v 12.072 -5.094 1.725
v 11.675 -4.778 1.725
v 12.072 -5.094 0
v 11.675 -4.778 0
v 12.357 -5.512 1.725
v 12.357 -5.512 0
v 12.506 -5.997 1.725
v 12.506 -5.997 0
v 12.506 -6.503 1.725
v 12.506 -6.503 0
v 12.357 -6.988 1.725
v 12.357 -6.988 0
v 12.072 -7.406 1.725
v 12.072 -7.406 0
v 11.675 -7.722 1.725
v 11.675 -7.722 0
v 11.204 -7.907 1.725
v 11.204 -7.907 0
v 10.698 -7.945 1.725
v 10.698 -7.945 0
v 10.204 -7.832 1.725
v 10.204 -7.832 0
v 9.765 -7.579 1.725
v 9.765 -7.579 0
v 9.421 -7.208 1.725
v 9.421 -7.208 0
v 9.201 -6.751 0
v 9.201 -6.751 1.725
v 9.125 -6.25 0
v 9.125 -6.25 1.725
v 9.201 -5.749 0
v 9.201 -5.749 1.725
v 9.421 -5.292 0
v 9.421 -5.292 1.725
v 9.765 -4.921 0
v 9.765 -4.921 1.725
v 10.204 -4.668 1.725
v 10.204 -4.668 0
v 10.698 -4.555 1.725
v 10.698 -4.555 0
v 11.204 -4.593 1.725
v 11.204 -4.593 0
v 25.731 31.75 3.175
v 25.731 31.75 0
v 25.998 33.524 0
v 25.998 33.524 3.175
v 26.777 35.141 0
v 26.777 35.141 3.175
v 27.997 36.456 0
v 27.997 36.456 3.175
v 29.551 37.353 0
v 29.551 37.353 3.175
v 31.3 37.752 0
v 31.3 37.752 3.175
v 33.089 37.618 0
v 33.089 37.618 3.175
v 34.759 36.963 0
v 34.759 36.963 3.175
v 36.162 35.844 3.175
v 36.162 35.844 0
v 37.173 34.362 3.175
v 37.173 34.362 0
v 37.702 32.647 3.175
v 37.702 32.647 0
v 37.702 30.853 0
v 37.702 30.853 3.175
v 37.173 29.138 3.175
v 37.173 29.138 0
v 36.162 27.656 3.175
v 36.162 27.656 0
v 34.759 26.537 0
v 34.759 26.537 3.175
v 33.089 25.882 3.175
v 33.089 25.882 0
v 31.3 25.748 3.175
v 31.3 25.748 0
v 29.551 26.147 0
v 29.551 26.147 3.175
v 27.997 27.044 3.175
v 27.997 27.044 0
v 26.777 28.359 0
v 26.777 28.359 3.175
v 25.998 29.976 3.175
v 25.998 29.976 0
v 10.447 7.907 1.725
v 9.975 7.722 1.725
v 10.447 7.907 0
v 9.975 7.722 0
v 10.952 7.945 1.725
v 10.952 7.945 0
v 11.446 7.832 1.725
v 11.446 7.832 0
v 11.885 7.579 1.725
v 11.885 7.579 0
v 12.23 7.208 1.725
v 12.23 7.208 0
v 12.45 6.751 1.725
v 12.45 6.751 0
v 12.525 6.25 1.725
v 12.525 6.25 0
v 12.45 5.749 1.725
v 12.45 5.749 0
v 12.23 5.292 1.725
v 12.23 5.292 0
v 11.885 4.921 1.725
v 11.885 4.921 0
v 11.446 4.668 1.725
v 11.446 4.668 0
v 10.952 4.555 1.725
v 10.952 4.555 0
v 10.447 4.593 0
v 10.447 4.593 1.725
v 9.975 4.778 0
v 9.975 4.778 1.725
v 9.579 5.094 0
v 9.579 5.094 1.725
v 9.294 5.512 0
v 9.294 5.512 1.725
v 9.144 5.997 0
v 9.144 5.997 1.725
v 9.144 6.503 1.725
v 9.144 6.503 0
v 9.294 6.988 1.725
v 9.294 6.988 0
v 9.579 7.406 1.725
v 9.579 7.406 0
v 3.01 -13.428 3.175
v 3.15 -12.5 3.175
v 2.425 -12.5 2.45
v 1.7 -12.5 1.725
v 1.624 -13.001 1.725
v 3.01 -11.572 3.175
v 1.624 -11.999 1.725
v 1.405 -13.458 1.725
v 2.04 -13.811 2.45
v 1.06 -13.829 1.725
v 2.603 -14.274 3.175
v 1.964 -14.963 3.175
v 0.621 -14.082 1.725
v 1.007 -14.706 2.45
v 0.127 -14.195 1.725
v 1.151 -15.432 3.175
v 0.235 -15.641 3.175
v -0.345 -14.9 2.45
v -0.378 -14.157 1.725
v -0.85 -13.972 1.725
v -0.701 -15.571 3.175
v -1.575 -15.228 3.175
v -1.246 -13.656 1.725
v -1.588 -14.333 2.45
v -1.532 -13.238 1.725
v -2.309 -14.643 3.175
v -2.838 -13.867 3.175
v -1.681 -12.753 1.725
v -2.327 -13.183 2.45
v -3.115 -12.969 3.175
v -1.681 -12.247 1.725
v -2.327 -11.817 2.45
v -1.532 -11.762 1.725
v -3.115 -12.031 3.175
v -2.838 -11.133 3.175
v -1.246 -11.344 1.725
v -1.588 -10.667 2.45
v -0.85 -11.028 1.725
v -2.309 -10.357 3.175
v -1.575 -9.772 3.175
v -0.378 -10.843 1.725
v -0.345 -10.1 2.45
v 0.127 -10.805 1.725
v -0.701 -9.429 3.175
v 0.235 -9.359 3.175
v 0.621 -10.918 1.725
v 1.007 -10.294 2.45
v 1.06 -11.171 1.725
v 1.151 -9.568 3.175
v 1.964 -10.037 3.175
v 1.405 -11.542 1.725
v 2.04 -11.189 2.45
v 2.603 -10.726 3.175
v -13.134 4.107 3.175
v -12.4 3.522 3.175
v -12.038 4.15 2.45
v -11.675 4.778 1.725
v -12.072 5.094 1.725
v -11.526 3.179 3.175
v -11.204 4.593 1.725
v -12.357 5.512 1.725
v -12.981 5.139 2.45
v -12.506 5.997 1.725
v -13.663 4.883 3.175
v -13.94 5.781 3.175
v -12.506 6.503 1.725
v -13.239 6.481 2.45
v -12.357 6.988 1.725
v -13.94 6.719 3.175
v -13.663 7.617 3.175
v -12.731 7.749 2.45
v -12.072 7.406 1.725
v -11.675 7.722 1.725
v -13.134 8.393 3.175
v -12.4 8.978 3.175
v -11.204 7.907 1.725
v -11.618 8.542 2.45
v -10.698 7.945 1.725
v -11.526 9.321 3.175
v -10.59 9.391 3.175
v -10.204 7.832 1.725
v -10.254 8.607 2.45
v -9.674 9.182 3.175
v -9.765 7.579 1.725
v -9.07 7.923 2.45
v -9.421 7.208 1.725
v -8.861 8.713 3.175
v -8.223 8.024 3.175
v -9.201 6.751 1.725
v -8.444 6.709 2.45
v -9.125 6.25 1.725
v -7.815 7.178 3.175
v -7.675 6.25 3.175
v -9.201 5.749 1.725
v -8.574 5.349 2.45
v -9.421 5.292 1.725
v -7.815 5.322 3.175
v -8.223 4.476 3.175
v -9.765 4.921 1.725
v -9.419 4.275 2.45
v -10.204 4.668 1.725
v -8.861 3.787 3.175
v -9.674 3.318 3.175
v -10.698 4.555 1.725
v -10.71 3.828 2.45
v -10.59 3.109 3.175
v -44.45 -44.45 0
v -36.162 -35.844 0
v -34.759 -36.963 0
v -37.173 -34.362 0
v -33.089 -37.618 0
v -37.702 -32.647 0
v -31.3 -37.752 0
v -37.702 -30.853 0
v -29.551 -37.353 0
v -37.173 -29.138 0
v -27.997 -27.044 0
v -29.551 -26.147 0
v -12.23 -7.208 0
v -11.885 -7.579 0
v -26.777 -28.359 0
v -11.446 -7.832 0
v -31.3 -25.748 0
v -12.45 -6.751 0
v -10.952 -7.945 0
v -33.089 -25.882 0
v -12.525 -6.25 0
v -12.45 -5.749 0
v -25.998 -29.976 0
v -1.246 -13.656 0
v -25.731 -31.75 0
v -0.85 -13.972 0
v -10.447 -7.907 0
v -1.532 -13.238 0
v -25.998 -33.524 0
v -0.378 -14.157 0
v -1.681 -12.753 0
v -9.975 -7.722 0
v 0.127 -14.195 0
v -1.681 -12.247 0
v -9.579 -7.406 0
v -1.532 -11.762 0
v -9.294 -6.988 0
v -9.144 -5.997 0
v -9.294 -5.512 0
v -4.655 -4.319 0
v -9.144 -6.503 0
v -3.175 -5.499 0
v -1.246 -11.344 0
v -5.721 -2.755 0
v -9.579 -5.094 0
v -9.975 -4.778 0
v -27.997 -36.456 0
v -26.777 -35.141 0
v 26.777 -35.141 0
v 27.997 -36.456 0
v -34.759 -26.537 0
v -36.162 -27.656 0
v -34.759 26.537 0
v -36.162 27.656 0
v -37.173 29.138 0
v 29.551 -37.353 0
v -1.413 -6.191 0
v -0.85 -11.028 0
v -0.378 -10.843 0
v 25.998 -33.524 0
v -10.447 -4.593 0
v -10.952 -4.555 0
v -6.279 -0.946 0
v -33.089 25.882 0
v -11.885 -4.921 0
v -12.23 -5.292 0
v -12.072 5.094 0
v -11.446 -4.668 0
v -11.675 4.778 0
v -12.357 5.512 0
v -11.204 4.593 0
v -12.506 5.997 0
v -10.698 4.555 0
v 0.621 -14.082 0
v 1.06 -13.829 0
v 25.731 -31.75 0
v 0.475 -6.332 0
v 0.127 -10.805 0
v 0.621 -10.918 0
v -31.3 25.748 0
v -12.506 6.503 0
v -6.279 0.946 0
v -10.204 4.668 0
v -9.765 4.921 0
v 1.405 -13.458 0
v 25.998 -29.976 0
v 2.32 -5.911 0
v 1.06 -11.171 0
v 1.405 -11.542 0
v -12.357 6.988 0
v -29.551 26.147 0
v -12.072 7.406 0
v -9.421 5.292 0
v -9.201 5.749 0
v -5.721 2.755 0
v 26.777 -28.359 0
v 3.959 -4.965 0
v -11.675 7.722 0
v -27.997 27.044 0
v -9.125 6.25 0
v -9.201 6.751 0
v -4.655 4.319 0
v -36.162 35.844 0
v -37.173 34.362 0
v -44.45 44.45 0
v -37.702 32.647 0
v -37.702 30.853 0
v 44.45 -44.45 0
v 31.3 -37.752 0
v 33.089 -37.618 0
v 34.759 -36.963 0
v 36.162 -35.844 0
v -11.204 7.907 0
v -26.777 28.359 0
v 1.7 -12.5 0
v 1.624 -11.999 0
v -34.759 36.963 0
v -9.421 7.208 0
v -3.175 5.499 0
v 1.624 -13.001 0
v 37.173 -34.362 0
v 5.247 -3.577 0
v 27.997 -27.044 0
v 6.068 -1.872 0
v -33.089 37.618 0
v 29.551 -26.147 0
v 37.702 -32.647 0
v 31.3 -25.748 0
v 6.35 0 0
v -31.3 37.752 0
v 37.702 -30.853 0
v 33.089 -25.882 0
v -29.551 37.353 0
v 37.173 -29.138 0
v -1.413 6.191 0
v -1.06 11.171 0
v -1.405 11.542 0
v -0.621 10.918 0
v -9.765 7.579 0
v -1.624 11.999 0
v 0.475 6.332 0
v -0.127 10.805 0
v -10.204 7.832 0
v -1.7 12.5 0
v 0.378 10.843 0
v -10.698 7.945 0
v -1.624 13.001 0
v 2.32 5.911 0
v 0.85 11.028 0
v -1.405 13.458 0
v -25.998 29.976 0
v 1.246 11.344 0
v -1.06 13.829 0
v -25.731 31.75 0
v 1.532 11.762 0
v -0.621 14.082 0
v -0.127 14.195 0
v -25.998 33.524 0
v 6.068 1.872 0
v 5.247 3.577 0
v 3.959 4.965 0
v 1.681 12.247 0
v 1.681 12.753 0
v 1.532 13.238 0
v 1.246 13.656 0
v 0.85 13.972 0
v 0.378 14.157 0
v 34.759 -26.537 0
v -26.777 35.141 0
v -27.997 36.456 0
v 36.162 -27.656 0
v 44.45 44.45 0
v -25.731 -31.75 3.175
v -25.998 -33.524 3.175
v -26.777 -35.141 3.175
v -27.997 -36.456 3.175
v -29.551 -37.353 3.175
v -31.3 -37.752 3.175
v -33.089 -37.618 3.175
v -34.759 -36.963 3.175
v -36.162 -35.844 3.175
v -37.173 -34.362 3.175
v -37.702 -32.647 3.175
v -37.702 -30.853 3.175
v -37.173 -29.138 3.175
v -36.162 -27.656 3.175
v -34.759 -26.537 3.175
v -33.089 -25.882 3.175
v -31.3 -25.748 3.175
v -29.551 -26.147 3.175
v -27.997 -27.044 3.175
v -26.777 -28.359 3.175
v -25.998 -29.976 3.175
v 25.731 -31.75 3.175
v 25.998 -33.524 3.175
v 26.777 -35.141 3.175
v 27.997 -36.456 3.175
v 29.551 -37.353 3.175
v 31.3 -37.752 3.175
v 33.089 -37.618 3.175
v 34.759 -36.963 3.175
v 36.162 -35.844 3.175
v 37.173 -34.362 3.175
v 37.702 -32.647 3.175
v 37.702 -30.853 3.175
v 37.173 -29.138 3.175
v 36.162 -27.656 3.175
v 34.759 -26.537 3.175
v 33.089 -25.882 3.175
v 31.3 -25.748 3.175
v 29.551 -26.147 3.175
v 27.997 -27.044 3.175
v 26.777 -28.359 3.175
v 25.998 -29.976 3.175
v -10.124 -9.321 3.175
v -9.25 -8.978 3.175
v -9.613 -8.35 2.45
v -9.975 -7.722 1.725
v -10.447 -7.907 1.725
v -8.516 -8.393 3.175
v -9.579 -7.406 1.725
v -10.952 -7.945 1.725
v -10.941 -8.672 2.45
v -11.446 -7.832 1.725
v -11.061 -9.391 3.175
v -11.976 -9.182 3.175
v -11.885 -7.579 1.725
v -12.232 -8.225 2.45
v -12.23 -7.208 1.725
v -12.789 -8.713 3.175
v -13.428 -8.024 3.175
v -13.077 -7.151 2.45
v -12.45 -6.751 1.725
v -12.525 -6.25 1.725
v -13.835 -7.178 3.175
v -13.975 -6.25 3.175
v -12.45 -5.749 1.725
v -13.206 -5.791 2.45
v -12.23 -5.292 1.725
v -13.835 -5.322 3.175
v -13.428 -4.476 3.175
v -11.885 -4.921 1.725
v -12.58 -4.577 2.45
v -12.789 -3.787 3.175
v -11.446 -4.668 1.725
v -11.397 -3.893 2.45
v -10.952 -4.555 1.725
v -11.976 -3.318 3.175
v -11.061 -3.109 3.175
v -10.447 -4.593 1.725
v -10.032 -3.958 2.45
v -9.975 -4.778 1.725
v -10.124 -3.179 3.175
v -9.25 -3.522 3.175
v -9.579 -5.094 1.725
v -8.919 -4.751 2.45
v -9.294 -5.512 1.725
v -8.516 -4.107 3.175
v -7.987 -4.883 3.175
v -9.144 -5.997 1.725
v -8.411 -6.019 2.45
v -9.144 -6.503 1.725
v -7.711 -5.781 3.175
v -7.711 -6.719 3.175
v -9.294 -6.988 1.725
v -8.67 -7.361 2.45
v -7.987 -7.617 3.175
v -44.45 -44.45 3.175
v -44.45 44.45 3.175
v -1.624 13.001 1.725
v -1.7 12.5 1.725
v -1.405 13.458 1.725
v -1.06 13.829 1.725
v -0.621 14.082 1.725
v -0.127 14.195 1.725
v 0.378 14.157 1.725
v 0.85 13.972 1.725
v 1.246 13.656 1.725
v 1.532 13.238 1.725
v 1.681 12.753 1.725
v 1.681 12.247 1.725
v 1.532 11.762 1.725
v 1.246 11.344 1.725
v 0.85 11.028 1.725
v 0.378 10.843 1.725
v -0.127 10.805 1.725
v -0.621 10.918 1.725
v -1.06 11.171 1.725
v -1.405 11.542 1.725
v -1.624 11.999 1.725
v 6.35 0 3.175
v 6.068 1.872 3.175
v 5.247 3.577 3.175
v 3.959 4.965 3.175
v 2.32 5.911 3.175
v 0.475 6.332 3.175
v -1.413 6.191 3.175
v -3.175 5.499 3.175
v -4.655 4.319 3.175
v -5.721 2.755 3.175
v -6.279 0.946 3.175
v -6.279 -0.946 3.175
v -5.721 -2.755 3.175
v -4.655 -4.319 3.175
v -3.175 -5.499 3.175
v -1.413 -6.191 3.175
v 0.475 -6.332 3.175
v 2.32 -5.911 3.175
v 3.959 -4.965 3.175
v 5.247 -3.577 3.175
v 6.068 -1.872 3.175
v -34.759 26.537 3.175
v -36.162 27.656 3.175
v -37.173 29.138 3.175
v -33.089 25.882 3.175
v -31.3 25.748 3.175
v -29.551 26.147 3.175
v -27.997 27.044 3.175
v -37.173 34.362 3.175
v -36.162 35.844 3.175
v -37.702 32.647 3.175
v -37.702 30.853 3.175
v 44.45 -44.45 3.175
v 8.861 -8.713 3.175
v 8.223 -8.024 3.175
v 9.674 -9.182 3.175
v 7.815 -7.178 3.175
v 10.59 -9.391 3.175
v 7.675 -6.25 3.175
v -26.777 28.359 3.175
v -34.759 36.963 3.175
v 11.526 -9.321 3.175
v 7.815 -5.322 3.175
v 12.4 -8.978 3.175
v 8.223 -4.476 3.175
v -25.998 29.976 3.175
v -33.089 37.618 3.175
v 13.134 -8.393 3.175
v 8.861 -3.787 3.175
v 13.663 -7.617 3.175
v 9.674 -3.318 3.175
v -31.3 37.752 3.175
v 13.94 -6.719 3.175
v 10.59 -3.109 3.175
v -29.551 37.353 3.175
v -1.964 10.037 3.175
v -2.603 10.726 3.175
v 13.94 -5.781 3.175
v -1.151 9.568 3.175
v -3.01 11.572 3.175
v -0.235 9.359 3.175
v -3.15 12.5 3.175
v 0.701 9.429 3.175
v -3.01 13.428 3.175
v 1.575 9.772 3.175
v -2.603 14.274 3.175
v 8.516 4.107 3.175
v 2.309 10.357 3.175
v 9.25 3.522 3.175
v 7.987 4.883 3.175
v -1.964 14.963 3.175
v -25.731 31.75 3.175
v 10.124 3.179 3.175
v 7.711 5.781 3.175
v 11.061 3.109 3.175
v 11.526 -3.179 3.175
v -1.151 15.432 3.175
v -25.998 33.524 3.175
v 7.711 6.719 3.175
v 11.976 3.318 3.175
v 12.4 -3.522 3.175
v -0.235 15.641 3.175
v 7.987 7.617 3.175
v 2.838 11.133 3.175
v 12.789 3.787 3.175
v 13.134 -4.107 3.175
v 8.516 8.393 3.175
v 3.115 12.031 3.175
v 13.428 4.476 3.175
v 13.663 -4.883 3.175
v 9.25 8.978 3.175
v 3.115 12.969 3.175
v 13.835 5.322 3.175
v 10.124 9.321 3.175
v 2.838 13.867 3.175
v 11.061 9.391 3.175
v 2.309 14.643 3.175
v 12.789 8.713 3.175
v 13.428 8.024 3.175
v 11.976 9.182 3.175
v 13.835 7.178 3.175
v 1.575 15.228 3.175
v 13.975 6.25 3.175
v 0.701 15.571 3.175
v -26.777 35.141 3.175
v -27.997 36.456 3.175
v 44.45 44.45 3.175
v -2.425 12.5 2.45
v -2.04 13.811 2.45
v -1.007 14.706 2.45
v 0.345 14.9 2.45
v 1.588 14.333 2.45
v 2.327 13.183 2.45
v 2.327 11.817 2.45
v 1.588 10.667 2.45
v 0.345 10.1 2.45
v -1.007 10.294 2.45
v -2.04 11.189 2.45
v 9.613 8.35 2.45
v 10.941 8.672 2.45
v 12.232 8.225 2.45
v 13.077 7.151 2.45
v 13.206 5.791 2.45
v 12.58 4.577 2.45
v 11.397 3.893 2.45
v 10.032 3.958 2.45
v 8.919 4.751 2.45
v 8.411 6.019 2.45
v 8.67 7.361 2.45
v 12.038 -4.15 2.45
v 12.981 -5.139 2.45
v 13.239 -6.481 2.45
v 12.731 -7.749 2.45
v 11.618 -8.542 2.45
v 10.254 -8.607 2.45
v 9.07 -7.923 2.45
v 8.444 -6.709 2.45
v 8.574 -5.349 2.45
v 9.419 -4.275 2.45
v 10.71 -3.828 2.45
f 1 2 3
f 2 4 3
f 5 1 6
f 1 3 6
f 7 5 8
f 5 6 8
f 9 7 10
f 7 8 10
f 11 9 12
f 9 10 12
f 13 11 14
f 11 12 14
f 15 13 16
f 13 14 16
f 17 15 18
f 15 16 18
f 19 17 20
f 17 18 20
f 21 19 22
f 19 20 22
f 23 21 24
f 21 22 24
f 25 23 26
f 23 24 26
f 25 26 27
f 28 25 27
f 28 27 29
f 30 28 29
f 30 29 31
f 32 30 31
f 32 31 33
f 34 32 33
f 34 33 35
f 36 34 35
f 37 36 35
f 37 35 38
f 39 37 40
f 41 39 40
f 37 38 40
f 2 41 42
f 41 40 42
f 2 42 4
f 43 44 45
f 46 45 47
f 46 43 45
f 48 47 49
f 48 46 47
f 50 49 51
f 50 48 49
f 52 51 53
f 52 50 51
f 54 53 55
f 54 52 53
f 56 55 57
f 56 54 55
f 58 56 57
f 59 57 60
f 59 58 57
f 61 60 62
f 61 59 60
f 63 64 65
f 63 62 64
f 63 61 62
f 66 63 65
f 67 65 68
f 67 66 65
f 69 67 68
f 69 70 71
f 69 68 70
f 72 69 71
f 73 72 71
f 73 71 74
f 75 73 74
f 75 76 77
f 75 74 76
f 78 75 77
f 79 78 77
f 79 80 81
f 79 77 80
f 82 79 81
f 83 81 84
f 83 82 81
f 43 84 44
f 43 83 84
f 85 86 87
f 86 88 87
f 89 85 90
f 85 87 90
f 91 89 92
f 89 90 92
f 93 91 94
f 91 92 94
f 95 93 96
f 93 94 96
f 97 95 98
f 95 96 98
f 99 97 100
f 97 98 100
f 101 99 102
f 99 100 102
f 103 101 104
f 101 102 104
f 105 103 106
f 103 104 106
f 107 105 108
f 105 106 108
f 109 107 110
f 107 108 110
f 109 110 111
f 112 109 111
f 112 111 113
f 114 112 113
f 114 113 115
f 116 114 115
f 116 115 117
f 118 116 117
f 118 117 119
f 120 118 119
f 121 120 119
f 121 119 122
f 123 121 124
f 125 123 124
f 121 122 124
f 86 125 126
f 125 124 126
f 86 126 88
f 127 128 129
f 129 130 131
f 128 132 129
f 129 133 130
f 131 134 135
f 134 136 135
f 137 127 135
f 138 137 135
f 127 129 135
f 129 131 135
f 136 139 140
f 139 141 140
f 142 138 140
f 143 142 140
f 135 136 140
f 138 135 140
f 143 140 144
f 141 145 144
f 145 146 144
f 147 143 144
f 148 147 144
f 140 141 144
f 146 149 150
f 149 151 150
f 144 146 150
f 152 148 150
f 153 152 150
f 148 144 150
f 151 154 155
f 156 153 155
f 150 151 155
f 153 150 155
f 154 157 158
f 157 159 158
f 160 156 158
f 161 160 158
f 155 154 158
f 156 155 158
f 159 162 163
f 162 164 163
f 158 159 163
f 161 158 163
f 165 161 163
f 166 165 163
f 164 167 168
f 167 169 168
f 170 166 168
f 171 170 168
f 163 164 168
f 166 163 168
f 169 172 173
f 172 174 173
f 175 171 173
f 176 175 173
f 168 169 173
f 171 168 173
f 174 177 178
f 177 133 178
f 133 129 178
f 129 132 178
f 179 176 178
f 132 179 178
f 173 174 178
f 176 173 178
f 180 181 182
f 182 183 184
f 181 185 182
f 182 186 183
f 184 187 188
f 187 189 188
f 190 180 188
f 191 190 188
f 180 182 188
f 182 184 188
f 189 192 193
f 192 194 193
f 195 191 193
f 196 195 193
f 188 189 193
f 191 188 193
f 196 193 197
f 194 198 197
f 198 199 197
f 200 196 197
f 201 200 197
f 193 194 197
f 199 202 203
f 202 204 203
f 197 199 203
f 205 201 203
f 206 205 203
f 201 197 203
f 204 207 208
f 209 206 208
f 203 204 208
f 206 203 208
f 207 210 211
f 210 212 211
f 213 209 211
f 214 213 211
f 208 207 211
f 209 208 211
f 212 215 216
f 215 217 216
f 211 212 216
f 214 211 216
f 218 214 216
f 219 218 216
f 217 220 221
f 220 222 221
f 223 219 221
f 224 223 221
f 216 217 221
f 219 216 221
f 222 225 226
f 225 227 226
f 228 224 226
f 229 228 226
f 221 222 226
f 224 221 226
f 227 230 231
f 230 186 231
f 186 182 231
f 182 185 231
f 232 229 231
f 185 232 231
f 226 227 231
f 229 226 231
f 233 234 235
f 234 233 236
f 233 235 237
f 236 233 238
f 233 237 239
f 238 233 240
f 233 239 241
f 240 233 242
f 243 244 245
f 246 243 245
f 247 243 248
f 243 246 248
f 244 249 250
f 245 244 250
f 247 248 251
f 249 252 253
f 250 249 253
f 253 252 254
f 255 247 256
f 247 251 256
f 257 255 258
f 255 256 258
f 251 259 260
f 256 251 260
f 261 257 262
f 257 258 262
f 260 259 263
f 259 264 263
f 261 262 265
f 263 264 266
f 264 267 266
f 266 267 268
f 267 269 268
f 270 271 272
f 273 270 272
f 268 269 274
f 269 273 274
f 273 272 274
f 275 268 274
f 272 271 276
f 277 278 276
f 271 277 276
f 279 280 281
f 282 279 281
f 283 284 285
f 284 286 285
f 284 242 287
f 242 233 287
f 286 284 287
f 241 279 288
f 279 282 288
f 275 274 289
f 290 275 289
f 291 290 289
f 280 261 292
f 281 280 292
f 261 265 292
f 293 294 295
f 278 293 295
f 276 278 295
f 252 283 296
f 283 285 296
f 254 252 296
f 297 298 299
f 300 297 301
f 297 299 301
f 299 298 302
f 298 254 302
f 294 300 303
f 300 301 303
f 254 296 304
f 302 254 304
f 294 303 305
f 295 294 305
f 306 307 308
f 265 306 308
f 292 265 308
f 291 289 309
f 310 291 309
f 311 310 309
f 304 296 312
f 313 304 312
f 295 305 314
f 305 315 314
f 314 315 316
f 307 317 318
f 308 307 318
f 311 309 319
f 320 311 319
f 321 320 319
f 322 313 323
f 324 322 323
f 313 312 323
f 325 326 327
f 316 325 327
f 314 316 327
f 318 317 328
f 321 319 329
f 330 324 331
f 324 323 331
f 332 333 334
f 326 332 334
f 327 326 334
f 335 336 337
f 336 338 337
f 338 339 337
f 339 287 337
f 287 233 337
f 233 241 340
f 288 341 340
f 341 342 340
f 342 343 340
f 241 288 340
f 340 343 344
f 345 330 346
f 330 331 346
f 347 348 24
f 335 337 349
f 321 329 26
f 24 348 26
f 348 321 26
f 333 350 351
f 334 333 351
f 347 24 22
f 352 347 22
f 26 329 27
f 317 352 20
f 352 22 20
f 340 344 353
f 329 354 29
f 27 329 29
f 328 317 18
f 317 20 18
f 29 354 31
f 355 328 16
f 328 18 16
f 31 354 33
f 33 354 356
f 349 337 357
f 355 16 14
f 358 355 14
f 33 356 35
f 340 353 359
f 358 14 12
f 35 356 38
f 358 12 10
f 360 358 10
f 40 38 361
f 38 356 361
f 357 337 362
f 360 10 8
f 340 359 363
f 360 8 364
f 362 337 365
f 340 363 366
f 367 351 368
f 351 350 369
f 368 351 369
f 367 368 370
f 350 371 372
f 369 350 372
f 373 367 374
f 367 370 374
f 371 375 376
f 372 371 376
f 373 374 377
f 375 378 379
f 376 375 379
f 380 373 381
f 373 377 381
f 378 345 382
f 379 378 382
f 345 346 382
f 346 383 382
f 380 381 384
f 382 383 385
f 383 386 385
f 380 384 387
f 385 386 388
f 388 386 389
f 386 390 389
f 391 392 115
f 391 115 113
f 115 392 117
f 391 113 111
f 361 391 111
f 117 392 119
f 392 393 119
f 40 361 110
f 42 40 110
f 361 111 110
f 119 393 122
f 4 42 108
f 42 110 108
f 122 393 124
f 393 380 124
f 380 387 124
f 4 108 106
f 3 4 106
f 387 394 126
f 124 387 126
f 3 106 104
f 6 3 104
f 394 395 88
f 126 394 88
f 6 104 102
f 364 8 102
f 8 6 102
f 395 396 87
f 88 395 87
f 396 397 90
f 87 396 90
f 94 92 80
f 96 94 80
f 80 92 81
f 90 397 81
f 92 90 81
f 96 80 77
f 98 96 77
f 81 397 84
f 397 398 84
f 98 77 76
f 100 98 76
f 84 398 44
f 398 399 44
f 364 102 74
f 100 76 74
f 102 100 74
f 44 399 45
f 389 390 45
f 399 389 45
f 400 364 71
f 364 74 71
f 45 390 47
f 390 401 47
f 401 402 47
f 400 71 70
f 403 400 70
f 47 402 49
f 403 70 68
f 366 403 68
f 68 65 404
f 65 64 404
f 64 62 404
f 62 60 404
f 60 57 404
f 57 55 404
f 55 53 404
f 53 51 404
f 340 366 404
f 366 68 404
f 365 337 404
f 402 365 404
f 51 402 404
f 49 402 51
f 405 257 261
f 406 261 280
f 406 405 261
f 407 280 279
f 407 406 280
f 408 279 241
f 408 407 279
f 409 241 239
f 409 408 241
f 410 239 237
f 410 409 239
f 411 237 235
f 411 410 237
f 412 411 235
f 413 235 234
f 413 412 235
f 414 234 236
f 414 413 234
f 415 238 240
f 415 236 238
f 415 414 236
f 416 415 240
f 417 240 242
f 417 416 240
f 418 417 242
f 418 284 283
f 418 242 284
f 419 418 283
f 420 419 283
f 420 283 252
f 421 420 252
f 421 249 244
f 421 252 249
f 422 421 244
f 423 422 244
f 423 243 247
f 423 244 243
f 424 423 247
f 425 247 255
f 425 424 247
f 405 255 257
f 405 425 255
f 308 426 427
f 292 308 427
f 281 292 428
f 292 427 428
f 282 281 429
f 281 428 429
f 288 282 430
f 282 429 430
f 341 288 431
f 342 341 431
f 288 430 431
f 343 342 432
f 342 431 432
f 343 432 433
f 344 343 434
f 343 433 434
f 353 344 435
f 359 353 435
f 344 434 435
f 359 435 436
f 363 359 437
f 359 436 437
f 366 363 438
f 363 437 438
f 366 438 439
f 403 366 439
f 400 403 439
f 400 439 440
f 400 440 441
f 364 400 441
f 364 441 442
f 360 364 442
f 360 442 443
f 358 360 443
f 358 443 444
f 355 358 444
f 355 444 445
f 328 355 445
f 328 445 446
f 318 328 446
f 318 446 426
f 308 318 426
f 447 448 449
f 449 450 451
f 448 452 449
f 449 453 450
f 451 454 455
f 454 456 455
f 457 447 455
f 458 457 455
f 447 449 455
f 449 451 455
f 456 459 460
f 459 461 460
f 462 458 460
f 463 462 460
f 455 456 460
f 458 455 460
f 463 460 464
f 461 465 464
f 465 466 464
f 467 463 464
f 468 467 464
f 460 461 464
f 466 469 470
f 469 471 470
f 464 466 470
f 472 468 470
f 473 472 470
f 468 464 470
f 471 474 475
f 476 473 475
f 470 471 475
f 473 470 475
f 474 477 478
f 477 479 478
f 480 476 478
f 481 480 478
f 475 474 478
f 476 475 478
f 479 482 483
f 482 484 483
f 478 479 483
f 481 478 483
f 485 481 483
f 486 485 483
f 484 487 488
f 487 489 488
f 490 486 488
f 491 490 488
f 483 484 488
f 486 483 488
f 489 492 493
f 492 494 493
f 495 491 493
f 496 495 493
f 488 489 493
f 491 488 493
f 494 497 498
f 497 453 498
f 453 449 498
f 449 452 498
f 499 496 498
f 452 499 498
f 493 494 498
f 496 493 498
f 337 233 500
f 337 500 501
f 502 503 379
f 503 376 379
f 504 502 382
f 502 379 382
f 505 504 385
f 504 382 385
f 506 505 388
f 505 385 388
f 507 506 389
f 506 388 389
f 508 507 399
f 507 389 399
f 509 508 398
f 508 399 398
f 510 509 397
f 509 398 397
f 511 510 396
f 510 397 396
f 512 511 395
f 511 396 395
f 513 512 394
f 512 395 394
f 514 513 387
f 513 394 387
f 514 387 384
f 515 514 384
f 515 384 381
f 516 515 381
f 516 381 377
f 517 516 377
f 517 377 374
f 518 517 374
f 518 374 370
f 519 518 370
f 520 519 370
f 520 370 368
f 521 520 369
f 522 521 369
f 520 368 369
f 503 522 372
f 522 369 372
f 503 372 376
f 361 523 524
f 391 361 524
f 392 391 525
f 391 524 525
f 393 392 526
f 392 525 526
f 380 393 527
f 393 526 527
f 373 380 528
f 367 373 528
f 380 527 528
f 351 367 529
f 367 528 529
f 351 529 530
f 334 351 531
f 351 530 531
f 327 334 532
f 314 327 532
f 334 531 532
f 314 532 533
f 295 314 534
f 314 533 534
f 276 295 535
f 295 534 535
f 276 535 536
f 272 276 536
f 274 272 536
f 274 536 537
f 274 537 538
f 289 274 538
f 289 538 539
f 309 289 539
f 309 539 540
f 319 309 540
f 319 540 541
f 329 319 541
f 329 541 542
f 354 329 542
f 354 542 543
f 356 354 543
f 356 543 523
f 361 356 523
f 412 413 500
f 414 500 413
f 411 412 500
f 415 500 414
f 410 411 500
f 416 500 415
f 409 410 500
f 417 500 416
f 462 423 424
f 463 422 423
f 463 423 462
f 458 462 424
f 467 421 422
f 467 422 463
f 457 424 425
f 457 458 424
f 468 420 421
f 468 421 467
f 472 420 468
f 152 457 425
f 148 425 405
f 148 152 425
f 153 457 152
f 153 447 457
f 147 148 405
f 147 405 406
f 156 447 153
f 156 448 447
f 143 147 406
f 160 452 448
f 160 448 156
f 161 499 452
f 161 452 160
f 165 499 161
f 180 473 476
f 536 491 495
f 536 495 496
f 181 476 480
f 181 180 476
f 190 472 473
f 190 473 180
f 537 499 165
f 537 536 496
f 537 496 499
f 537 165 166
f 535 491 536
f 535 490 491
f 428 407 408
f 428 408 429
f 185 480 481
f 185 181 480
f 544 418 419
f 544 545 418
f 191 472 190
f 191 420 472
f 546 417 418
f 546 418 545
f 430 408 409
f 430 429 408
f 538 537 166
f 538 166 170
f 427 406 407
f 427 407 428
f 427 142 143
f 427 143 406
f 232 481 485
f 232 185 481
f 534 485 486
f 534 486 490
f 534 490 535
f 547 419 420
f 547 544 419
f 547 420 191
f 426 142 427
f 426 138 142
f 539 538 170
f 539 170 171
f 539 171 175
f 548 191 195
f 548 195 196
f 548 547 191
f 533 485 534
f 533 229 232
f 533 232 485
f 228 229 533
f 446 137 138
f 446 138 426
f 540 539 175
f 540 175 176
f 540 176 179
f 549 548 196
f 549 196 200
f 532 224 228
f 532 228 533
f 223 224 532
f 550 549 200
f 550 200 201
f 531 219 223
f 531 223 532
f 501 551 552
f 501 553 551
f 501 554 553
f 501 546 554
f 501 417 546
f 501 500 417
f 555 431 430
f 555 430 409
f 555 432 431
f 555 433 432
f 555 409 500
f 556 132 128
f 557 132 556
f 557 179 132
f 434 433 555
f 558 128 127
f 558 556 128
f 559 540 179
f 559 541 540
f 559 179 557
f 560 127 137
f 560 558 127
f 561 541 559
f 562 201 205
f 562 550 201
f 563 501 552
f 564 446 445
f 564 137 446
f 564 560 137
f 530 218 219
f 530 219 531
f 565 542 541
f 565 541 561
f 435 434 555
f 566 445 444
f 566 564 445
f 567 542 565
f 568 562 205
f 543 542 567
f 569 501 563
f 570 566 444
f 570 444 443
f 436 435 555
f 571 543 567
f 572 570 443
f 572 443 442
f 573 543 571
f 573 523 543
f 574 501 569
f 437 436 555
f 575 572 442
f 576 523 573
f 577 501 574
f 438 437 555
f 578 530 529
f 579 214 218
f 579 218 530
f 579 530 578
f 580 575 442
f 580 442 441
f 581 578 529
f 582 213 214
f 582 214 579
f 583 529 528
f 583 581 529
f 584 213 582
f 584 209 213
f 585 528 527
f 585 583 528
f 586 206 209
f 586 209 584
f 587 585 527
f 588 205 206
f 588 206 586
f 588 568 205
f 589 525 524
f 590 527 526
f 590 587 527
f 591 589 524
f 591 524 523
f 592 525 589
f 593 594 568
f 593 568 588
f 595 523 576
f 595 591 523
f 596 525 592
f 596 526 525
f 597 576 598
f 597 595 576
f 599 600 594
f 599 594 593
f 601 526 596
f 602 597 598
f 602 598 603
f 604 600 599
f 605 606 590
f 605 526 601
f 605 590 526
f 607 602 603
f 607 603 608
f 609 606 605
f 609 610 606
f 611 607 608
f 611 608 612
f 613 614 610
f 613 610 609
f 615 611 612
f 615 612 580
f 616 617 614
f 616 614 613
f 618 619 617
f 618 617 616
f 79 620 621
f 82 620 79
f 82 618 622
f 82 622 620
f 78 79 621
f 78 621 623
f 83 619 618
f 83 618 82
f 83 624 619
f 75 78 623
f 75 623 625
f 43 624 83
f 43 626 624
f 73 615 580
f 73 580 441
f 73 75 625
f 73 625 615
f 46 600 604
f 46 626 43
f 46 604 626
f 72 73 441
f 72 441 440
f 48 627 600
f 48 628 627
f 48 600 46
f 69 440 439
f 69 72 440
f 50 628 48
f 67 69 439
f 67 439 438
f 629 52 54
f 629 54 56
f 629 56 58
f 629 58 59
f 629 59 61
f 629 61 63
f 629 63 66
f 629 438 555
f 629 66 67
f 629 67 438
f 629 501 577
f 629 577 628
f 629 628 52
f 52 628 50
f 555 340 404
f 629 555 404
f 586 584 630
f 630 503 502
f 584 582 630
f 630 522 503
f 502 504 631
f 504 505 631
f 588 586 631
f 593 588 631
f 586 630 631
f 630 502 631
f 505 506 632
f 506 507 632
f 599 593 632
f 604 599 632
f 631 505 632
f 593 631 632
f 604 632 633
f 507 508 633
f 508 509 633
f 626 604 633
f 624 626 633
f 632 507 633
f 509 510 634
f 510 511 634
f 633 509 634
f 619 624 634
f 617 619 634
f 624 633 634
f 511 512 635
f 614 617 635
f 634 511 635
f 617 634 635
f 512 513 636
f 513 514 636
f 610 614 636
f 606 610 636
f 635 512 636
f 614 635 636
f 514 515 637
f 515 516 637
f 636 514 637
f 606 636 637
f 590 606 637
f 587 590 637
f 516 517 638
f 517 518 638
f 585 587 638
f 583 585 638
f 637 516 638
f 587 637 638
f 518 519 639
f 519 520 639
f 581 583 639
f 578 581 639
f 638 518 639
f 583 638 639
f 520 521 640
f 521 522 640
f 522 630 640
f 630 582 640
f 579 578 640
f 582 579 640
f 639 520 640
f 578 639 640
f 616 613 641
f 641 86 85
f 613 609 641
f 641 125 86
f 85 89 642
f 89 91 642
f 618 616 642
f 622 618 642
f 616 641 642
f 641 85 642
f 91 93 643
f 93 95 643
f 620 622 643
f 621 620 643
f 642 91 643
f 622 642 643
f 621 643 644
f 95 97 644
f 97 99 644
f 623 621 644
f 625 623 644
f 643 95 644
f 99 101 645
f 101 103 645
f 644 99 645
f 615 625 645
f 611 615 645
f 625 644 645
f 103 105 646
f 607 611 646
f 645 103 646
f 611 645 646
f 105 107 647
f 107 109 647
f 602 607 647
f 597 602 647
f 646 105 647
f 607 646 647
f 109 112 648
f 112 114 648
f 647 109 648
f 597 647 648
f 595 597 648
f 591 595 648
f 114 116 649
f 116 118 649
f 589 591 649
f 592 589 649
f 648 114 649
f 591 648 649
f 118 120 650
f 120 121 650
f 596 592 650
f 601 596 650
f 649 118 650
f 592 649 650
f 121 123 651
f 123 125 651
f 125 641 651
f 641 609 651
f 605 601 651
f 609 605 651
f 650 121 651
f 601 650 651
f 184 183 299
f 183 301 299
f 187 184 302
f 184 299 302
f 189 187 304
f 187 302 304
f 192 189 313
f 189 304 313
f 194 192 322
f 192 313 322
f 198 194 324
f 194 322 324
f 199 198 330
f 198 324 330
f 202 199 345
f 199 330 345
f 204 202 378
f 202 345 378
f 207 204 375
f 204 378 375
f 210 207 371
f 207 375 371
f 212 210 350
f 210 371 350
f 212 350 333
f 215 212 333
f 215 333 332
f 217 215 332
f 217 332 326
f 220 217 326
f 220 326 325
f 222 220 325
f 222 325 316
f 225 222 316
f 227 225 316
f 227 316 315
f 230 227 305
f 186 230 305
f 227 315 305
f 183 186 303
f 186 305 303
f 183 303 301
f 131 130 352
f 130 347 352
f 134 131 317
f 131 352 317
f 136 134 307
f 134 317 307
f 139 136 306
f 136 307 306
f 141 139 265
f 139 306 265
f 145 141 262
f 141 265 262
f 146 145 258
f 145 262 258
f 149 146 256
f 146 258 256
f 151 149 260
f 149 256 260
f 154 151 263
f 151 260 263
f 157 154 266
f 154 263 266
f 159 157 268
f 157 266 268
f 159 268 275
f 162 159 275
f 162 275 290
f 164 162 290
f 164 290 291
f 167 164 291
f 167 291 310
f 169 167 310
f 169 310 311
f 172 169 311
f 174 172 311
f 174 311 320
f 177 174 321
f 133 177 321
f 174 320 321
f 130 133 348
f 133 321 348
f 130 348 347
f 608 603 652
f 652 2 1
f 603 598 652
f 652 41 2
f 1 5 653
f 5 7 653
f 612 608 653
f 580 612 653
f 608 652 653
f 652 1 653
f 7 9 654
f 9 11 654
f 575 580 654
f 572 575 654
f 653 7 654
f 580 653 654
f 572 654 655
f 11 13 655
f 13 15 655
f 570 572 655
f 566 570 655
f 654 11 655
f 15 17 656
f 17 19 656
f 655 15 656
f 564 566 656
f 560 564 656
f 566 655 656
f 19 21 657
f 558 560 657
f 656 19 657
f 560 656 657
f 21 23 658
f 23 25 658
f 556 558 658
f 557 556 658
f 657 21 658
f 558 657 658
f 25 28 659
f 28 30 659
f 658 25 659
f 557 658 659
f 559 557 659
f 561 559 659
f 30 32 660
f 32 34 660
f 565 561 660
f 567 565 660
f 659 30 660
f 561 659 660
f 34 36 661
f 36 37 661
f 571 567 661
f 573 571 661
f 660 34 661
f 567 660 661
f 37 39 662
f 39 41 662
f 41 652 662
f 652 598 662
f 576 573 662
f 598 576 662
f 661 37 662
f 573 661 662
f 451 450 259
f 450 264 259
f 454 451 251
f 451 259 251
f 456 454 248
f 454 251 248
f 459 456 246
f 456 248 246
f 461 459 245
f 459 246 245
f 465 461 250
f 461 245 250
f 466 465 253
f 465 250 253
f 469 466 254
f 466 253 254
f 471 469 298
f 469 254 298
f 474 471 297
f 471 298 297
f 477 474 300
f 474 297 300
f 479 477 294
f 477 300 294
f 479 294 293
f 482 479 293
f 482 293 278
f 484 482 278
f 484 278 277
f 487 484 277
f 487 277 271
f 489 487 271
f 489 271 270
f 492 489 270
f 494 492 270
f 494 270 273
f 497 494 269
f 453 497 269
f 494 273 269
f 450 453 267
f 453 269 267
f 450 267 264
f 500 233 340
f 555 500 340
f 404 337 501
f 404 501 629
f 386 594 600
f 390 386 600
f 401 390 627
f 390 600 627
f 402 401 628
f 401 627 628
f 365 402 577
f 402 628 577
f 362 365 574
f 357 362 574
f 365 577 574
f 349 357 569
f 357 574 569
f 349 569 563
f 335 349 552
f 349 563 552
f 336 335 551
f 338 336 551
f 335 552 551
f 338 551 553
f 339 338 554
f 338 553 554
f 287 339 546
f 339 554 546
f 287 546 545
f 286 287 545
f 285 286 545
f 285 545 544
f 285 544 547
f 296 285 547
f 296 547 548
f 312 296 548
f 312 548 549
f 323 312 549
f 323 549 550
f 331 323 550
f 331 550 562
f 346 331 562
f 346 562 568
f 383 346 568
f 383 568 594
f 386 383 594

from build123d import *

# Parameters (mm, degrees)
SKETCH1_W                                       = 88.9
SKETCH1_H                                       = 88.9
BOSS_EXTRUDE1_DEPTH                             = 3.175
SKETCH3_R                                       = 6.018919743
CUT_EXTRUDE1_DEPTH                              = 4.175
MIRROR2_COPY_1_SKETCH_R                         = 6.018919743
MIRROR2_COPY_1_DEPTH                            = 4.175
SKETCH4_R                                       = 6.35
CUT_EXTRUDE2_DEPTH                              = 4.175
CSK_FOR_M3_FLAT_HEAD_MACHINE_SCREW1_D           = 3.4
CSK_FOR_M3_FLAT_HEAD_MACHINE_SCREW1_CSINK_D     = 6.3
CSK_FOR_M3_FLAT_HEAD_MACHINE_SCREW1_CSINK_ANGLE = 90
CIRPATTERN1_COUNT                               = 6


with BuildPart() as part:
    # Sketch1 → Boss-Extrude1 (new body)
    with BuildSketch(Plane.XY):
        Rectangle(SKETCH1_W, SKETCH1_H)
    extrude(amount=BOSS_EXTRUDE1_DEPTH)

    # Sketch3 → Cut-Extrude1 (cut, through all)
    with BuildSketch(Plane.XY.offset(3.175)):
        with Locations((-31.75, 31.75)):
            Circle(SKETCH3_R)
    cut_extrude1 = extrude(amount=-CUT_EXTRUDE1_DEPTH, mode=Mode.SUBTRACT)

    # Mirror1: Cut-Extrude1 across plane
    add(cut_extrude1.mirror(Plane(origin=(0, 0, 0), x_dir=(0, 0, 1), z_dir=(1, 0, 0))), mode=Mode.SUBTRACT)

    # Mirror2: Cut-Extrude1 across plane
    add(cut_extrude1.mirror(Plane.ZX), mode=Mode.SUBTRACT)

    # Mirror2 copy 1 sketch → Mirror2 copy 1 (cut, through all)
    with BuildSketch(Plane(origin=(0, 0, 3.175), x_dir=(-1, 0, 0), z_dir=(0, 0, 1))):
        with Locations((-31.75, 31.75)):
            Circle(MIRROR2_COPY_1_SKETCH_R)
    extrude(amount=-MIRROR2_COPY_1_DEPTH, mode=Mode.SUBTRACT)

    # Sketch4 → Cut-Extrude2 (cut, through all)
    with BuildSketch(Plane.XY.offset(3.175)):
        Circle(SKETCH4_R)
    extrude(amount=-CUT_EXTRUDE2_DEPTH, mode=Mode.SUBTRACT)

    # CSK for M3 Flat Head Machine Screw1 (through all)
    with Locations(Plane.XY.offset(3.175)):
        with Locations((0, 12.5)):
            csk_for_m3_flat_head_machine_screw1 = CounterSinkHole(CSK_FOR_M3_FLAT_HEAD_MACHINE_SCREW1_D / 2, CSK_FOR_M3_FLAT_HEAD_MACHINE_SCREW1_CSINK_D / 2, counter_sink_angle=CSK_FOR_M3_FLAT_HEAD_MACHINE_SCREW1_CSINK_ANGLE)

    # CirPattern1: CSK for M3 Flat Head Machine Screw1 ×6 about axis
    cirpattern1_axis = Axis((0, 0, 0), (0, 0, 1))
    for i in range(1, CIRPATTERN1_COUNT):
        add(csk_for_m3_flat_head_machine_screw1.rotate(cirpattern1_axis, i * 360 / CIRPATTERN1_COUNT), mode=Mode.SUBTRACT)


solid = part.part
